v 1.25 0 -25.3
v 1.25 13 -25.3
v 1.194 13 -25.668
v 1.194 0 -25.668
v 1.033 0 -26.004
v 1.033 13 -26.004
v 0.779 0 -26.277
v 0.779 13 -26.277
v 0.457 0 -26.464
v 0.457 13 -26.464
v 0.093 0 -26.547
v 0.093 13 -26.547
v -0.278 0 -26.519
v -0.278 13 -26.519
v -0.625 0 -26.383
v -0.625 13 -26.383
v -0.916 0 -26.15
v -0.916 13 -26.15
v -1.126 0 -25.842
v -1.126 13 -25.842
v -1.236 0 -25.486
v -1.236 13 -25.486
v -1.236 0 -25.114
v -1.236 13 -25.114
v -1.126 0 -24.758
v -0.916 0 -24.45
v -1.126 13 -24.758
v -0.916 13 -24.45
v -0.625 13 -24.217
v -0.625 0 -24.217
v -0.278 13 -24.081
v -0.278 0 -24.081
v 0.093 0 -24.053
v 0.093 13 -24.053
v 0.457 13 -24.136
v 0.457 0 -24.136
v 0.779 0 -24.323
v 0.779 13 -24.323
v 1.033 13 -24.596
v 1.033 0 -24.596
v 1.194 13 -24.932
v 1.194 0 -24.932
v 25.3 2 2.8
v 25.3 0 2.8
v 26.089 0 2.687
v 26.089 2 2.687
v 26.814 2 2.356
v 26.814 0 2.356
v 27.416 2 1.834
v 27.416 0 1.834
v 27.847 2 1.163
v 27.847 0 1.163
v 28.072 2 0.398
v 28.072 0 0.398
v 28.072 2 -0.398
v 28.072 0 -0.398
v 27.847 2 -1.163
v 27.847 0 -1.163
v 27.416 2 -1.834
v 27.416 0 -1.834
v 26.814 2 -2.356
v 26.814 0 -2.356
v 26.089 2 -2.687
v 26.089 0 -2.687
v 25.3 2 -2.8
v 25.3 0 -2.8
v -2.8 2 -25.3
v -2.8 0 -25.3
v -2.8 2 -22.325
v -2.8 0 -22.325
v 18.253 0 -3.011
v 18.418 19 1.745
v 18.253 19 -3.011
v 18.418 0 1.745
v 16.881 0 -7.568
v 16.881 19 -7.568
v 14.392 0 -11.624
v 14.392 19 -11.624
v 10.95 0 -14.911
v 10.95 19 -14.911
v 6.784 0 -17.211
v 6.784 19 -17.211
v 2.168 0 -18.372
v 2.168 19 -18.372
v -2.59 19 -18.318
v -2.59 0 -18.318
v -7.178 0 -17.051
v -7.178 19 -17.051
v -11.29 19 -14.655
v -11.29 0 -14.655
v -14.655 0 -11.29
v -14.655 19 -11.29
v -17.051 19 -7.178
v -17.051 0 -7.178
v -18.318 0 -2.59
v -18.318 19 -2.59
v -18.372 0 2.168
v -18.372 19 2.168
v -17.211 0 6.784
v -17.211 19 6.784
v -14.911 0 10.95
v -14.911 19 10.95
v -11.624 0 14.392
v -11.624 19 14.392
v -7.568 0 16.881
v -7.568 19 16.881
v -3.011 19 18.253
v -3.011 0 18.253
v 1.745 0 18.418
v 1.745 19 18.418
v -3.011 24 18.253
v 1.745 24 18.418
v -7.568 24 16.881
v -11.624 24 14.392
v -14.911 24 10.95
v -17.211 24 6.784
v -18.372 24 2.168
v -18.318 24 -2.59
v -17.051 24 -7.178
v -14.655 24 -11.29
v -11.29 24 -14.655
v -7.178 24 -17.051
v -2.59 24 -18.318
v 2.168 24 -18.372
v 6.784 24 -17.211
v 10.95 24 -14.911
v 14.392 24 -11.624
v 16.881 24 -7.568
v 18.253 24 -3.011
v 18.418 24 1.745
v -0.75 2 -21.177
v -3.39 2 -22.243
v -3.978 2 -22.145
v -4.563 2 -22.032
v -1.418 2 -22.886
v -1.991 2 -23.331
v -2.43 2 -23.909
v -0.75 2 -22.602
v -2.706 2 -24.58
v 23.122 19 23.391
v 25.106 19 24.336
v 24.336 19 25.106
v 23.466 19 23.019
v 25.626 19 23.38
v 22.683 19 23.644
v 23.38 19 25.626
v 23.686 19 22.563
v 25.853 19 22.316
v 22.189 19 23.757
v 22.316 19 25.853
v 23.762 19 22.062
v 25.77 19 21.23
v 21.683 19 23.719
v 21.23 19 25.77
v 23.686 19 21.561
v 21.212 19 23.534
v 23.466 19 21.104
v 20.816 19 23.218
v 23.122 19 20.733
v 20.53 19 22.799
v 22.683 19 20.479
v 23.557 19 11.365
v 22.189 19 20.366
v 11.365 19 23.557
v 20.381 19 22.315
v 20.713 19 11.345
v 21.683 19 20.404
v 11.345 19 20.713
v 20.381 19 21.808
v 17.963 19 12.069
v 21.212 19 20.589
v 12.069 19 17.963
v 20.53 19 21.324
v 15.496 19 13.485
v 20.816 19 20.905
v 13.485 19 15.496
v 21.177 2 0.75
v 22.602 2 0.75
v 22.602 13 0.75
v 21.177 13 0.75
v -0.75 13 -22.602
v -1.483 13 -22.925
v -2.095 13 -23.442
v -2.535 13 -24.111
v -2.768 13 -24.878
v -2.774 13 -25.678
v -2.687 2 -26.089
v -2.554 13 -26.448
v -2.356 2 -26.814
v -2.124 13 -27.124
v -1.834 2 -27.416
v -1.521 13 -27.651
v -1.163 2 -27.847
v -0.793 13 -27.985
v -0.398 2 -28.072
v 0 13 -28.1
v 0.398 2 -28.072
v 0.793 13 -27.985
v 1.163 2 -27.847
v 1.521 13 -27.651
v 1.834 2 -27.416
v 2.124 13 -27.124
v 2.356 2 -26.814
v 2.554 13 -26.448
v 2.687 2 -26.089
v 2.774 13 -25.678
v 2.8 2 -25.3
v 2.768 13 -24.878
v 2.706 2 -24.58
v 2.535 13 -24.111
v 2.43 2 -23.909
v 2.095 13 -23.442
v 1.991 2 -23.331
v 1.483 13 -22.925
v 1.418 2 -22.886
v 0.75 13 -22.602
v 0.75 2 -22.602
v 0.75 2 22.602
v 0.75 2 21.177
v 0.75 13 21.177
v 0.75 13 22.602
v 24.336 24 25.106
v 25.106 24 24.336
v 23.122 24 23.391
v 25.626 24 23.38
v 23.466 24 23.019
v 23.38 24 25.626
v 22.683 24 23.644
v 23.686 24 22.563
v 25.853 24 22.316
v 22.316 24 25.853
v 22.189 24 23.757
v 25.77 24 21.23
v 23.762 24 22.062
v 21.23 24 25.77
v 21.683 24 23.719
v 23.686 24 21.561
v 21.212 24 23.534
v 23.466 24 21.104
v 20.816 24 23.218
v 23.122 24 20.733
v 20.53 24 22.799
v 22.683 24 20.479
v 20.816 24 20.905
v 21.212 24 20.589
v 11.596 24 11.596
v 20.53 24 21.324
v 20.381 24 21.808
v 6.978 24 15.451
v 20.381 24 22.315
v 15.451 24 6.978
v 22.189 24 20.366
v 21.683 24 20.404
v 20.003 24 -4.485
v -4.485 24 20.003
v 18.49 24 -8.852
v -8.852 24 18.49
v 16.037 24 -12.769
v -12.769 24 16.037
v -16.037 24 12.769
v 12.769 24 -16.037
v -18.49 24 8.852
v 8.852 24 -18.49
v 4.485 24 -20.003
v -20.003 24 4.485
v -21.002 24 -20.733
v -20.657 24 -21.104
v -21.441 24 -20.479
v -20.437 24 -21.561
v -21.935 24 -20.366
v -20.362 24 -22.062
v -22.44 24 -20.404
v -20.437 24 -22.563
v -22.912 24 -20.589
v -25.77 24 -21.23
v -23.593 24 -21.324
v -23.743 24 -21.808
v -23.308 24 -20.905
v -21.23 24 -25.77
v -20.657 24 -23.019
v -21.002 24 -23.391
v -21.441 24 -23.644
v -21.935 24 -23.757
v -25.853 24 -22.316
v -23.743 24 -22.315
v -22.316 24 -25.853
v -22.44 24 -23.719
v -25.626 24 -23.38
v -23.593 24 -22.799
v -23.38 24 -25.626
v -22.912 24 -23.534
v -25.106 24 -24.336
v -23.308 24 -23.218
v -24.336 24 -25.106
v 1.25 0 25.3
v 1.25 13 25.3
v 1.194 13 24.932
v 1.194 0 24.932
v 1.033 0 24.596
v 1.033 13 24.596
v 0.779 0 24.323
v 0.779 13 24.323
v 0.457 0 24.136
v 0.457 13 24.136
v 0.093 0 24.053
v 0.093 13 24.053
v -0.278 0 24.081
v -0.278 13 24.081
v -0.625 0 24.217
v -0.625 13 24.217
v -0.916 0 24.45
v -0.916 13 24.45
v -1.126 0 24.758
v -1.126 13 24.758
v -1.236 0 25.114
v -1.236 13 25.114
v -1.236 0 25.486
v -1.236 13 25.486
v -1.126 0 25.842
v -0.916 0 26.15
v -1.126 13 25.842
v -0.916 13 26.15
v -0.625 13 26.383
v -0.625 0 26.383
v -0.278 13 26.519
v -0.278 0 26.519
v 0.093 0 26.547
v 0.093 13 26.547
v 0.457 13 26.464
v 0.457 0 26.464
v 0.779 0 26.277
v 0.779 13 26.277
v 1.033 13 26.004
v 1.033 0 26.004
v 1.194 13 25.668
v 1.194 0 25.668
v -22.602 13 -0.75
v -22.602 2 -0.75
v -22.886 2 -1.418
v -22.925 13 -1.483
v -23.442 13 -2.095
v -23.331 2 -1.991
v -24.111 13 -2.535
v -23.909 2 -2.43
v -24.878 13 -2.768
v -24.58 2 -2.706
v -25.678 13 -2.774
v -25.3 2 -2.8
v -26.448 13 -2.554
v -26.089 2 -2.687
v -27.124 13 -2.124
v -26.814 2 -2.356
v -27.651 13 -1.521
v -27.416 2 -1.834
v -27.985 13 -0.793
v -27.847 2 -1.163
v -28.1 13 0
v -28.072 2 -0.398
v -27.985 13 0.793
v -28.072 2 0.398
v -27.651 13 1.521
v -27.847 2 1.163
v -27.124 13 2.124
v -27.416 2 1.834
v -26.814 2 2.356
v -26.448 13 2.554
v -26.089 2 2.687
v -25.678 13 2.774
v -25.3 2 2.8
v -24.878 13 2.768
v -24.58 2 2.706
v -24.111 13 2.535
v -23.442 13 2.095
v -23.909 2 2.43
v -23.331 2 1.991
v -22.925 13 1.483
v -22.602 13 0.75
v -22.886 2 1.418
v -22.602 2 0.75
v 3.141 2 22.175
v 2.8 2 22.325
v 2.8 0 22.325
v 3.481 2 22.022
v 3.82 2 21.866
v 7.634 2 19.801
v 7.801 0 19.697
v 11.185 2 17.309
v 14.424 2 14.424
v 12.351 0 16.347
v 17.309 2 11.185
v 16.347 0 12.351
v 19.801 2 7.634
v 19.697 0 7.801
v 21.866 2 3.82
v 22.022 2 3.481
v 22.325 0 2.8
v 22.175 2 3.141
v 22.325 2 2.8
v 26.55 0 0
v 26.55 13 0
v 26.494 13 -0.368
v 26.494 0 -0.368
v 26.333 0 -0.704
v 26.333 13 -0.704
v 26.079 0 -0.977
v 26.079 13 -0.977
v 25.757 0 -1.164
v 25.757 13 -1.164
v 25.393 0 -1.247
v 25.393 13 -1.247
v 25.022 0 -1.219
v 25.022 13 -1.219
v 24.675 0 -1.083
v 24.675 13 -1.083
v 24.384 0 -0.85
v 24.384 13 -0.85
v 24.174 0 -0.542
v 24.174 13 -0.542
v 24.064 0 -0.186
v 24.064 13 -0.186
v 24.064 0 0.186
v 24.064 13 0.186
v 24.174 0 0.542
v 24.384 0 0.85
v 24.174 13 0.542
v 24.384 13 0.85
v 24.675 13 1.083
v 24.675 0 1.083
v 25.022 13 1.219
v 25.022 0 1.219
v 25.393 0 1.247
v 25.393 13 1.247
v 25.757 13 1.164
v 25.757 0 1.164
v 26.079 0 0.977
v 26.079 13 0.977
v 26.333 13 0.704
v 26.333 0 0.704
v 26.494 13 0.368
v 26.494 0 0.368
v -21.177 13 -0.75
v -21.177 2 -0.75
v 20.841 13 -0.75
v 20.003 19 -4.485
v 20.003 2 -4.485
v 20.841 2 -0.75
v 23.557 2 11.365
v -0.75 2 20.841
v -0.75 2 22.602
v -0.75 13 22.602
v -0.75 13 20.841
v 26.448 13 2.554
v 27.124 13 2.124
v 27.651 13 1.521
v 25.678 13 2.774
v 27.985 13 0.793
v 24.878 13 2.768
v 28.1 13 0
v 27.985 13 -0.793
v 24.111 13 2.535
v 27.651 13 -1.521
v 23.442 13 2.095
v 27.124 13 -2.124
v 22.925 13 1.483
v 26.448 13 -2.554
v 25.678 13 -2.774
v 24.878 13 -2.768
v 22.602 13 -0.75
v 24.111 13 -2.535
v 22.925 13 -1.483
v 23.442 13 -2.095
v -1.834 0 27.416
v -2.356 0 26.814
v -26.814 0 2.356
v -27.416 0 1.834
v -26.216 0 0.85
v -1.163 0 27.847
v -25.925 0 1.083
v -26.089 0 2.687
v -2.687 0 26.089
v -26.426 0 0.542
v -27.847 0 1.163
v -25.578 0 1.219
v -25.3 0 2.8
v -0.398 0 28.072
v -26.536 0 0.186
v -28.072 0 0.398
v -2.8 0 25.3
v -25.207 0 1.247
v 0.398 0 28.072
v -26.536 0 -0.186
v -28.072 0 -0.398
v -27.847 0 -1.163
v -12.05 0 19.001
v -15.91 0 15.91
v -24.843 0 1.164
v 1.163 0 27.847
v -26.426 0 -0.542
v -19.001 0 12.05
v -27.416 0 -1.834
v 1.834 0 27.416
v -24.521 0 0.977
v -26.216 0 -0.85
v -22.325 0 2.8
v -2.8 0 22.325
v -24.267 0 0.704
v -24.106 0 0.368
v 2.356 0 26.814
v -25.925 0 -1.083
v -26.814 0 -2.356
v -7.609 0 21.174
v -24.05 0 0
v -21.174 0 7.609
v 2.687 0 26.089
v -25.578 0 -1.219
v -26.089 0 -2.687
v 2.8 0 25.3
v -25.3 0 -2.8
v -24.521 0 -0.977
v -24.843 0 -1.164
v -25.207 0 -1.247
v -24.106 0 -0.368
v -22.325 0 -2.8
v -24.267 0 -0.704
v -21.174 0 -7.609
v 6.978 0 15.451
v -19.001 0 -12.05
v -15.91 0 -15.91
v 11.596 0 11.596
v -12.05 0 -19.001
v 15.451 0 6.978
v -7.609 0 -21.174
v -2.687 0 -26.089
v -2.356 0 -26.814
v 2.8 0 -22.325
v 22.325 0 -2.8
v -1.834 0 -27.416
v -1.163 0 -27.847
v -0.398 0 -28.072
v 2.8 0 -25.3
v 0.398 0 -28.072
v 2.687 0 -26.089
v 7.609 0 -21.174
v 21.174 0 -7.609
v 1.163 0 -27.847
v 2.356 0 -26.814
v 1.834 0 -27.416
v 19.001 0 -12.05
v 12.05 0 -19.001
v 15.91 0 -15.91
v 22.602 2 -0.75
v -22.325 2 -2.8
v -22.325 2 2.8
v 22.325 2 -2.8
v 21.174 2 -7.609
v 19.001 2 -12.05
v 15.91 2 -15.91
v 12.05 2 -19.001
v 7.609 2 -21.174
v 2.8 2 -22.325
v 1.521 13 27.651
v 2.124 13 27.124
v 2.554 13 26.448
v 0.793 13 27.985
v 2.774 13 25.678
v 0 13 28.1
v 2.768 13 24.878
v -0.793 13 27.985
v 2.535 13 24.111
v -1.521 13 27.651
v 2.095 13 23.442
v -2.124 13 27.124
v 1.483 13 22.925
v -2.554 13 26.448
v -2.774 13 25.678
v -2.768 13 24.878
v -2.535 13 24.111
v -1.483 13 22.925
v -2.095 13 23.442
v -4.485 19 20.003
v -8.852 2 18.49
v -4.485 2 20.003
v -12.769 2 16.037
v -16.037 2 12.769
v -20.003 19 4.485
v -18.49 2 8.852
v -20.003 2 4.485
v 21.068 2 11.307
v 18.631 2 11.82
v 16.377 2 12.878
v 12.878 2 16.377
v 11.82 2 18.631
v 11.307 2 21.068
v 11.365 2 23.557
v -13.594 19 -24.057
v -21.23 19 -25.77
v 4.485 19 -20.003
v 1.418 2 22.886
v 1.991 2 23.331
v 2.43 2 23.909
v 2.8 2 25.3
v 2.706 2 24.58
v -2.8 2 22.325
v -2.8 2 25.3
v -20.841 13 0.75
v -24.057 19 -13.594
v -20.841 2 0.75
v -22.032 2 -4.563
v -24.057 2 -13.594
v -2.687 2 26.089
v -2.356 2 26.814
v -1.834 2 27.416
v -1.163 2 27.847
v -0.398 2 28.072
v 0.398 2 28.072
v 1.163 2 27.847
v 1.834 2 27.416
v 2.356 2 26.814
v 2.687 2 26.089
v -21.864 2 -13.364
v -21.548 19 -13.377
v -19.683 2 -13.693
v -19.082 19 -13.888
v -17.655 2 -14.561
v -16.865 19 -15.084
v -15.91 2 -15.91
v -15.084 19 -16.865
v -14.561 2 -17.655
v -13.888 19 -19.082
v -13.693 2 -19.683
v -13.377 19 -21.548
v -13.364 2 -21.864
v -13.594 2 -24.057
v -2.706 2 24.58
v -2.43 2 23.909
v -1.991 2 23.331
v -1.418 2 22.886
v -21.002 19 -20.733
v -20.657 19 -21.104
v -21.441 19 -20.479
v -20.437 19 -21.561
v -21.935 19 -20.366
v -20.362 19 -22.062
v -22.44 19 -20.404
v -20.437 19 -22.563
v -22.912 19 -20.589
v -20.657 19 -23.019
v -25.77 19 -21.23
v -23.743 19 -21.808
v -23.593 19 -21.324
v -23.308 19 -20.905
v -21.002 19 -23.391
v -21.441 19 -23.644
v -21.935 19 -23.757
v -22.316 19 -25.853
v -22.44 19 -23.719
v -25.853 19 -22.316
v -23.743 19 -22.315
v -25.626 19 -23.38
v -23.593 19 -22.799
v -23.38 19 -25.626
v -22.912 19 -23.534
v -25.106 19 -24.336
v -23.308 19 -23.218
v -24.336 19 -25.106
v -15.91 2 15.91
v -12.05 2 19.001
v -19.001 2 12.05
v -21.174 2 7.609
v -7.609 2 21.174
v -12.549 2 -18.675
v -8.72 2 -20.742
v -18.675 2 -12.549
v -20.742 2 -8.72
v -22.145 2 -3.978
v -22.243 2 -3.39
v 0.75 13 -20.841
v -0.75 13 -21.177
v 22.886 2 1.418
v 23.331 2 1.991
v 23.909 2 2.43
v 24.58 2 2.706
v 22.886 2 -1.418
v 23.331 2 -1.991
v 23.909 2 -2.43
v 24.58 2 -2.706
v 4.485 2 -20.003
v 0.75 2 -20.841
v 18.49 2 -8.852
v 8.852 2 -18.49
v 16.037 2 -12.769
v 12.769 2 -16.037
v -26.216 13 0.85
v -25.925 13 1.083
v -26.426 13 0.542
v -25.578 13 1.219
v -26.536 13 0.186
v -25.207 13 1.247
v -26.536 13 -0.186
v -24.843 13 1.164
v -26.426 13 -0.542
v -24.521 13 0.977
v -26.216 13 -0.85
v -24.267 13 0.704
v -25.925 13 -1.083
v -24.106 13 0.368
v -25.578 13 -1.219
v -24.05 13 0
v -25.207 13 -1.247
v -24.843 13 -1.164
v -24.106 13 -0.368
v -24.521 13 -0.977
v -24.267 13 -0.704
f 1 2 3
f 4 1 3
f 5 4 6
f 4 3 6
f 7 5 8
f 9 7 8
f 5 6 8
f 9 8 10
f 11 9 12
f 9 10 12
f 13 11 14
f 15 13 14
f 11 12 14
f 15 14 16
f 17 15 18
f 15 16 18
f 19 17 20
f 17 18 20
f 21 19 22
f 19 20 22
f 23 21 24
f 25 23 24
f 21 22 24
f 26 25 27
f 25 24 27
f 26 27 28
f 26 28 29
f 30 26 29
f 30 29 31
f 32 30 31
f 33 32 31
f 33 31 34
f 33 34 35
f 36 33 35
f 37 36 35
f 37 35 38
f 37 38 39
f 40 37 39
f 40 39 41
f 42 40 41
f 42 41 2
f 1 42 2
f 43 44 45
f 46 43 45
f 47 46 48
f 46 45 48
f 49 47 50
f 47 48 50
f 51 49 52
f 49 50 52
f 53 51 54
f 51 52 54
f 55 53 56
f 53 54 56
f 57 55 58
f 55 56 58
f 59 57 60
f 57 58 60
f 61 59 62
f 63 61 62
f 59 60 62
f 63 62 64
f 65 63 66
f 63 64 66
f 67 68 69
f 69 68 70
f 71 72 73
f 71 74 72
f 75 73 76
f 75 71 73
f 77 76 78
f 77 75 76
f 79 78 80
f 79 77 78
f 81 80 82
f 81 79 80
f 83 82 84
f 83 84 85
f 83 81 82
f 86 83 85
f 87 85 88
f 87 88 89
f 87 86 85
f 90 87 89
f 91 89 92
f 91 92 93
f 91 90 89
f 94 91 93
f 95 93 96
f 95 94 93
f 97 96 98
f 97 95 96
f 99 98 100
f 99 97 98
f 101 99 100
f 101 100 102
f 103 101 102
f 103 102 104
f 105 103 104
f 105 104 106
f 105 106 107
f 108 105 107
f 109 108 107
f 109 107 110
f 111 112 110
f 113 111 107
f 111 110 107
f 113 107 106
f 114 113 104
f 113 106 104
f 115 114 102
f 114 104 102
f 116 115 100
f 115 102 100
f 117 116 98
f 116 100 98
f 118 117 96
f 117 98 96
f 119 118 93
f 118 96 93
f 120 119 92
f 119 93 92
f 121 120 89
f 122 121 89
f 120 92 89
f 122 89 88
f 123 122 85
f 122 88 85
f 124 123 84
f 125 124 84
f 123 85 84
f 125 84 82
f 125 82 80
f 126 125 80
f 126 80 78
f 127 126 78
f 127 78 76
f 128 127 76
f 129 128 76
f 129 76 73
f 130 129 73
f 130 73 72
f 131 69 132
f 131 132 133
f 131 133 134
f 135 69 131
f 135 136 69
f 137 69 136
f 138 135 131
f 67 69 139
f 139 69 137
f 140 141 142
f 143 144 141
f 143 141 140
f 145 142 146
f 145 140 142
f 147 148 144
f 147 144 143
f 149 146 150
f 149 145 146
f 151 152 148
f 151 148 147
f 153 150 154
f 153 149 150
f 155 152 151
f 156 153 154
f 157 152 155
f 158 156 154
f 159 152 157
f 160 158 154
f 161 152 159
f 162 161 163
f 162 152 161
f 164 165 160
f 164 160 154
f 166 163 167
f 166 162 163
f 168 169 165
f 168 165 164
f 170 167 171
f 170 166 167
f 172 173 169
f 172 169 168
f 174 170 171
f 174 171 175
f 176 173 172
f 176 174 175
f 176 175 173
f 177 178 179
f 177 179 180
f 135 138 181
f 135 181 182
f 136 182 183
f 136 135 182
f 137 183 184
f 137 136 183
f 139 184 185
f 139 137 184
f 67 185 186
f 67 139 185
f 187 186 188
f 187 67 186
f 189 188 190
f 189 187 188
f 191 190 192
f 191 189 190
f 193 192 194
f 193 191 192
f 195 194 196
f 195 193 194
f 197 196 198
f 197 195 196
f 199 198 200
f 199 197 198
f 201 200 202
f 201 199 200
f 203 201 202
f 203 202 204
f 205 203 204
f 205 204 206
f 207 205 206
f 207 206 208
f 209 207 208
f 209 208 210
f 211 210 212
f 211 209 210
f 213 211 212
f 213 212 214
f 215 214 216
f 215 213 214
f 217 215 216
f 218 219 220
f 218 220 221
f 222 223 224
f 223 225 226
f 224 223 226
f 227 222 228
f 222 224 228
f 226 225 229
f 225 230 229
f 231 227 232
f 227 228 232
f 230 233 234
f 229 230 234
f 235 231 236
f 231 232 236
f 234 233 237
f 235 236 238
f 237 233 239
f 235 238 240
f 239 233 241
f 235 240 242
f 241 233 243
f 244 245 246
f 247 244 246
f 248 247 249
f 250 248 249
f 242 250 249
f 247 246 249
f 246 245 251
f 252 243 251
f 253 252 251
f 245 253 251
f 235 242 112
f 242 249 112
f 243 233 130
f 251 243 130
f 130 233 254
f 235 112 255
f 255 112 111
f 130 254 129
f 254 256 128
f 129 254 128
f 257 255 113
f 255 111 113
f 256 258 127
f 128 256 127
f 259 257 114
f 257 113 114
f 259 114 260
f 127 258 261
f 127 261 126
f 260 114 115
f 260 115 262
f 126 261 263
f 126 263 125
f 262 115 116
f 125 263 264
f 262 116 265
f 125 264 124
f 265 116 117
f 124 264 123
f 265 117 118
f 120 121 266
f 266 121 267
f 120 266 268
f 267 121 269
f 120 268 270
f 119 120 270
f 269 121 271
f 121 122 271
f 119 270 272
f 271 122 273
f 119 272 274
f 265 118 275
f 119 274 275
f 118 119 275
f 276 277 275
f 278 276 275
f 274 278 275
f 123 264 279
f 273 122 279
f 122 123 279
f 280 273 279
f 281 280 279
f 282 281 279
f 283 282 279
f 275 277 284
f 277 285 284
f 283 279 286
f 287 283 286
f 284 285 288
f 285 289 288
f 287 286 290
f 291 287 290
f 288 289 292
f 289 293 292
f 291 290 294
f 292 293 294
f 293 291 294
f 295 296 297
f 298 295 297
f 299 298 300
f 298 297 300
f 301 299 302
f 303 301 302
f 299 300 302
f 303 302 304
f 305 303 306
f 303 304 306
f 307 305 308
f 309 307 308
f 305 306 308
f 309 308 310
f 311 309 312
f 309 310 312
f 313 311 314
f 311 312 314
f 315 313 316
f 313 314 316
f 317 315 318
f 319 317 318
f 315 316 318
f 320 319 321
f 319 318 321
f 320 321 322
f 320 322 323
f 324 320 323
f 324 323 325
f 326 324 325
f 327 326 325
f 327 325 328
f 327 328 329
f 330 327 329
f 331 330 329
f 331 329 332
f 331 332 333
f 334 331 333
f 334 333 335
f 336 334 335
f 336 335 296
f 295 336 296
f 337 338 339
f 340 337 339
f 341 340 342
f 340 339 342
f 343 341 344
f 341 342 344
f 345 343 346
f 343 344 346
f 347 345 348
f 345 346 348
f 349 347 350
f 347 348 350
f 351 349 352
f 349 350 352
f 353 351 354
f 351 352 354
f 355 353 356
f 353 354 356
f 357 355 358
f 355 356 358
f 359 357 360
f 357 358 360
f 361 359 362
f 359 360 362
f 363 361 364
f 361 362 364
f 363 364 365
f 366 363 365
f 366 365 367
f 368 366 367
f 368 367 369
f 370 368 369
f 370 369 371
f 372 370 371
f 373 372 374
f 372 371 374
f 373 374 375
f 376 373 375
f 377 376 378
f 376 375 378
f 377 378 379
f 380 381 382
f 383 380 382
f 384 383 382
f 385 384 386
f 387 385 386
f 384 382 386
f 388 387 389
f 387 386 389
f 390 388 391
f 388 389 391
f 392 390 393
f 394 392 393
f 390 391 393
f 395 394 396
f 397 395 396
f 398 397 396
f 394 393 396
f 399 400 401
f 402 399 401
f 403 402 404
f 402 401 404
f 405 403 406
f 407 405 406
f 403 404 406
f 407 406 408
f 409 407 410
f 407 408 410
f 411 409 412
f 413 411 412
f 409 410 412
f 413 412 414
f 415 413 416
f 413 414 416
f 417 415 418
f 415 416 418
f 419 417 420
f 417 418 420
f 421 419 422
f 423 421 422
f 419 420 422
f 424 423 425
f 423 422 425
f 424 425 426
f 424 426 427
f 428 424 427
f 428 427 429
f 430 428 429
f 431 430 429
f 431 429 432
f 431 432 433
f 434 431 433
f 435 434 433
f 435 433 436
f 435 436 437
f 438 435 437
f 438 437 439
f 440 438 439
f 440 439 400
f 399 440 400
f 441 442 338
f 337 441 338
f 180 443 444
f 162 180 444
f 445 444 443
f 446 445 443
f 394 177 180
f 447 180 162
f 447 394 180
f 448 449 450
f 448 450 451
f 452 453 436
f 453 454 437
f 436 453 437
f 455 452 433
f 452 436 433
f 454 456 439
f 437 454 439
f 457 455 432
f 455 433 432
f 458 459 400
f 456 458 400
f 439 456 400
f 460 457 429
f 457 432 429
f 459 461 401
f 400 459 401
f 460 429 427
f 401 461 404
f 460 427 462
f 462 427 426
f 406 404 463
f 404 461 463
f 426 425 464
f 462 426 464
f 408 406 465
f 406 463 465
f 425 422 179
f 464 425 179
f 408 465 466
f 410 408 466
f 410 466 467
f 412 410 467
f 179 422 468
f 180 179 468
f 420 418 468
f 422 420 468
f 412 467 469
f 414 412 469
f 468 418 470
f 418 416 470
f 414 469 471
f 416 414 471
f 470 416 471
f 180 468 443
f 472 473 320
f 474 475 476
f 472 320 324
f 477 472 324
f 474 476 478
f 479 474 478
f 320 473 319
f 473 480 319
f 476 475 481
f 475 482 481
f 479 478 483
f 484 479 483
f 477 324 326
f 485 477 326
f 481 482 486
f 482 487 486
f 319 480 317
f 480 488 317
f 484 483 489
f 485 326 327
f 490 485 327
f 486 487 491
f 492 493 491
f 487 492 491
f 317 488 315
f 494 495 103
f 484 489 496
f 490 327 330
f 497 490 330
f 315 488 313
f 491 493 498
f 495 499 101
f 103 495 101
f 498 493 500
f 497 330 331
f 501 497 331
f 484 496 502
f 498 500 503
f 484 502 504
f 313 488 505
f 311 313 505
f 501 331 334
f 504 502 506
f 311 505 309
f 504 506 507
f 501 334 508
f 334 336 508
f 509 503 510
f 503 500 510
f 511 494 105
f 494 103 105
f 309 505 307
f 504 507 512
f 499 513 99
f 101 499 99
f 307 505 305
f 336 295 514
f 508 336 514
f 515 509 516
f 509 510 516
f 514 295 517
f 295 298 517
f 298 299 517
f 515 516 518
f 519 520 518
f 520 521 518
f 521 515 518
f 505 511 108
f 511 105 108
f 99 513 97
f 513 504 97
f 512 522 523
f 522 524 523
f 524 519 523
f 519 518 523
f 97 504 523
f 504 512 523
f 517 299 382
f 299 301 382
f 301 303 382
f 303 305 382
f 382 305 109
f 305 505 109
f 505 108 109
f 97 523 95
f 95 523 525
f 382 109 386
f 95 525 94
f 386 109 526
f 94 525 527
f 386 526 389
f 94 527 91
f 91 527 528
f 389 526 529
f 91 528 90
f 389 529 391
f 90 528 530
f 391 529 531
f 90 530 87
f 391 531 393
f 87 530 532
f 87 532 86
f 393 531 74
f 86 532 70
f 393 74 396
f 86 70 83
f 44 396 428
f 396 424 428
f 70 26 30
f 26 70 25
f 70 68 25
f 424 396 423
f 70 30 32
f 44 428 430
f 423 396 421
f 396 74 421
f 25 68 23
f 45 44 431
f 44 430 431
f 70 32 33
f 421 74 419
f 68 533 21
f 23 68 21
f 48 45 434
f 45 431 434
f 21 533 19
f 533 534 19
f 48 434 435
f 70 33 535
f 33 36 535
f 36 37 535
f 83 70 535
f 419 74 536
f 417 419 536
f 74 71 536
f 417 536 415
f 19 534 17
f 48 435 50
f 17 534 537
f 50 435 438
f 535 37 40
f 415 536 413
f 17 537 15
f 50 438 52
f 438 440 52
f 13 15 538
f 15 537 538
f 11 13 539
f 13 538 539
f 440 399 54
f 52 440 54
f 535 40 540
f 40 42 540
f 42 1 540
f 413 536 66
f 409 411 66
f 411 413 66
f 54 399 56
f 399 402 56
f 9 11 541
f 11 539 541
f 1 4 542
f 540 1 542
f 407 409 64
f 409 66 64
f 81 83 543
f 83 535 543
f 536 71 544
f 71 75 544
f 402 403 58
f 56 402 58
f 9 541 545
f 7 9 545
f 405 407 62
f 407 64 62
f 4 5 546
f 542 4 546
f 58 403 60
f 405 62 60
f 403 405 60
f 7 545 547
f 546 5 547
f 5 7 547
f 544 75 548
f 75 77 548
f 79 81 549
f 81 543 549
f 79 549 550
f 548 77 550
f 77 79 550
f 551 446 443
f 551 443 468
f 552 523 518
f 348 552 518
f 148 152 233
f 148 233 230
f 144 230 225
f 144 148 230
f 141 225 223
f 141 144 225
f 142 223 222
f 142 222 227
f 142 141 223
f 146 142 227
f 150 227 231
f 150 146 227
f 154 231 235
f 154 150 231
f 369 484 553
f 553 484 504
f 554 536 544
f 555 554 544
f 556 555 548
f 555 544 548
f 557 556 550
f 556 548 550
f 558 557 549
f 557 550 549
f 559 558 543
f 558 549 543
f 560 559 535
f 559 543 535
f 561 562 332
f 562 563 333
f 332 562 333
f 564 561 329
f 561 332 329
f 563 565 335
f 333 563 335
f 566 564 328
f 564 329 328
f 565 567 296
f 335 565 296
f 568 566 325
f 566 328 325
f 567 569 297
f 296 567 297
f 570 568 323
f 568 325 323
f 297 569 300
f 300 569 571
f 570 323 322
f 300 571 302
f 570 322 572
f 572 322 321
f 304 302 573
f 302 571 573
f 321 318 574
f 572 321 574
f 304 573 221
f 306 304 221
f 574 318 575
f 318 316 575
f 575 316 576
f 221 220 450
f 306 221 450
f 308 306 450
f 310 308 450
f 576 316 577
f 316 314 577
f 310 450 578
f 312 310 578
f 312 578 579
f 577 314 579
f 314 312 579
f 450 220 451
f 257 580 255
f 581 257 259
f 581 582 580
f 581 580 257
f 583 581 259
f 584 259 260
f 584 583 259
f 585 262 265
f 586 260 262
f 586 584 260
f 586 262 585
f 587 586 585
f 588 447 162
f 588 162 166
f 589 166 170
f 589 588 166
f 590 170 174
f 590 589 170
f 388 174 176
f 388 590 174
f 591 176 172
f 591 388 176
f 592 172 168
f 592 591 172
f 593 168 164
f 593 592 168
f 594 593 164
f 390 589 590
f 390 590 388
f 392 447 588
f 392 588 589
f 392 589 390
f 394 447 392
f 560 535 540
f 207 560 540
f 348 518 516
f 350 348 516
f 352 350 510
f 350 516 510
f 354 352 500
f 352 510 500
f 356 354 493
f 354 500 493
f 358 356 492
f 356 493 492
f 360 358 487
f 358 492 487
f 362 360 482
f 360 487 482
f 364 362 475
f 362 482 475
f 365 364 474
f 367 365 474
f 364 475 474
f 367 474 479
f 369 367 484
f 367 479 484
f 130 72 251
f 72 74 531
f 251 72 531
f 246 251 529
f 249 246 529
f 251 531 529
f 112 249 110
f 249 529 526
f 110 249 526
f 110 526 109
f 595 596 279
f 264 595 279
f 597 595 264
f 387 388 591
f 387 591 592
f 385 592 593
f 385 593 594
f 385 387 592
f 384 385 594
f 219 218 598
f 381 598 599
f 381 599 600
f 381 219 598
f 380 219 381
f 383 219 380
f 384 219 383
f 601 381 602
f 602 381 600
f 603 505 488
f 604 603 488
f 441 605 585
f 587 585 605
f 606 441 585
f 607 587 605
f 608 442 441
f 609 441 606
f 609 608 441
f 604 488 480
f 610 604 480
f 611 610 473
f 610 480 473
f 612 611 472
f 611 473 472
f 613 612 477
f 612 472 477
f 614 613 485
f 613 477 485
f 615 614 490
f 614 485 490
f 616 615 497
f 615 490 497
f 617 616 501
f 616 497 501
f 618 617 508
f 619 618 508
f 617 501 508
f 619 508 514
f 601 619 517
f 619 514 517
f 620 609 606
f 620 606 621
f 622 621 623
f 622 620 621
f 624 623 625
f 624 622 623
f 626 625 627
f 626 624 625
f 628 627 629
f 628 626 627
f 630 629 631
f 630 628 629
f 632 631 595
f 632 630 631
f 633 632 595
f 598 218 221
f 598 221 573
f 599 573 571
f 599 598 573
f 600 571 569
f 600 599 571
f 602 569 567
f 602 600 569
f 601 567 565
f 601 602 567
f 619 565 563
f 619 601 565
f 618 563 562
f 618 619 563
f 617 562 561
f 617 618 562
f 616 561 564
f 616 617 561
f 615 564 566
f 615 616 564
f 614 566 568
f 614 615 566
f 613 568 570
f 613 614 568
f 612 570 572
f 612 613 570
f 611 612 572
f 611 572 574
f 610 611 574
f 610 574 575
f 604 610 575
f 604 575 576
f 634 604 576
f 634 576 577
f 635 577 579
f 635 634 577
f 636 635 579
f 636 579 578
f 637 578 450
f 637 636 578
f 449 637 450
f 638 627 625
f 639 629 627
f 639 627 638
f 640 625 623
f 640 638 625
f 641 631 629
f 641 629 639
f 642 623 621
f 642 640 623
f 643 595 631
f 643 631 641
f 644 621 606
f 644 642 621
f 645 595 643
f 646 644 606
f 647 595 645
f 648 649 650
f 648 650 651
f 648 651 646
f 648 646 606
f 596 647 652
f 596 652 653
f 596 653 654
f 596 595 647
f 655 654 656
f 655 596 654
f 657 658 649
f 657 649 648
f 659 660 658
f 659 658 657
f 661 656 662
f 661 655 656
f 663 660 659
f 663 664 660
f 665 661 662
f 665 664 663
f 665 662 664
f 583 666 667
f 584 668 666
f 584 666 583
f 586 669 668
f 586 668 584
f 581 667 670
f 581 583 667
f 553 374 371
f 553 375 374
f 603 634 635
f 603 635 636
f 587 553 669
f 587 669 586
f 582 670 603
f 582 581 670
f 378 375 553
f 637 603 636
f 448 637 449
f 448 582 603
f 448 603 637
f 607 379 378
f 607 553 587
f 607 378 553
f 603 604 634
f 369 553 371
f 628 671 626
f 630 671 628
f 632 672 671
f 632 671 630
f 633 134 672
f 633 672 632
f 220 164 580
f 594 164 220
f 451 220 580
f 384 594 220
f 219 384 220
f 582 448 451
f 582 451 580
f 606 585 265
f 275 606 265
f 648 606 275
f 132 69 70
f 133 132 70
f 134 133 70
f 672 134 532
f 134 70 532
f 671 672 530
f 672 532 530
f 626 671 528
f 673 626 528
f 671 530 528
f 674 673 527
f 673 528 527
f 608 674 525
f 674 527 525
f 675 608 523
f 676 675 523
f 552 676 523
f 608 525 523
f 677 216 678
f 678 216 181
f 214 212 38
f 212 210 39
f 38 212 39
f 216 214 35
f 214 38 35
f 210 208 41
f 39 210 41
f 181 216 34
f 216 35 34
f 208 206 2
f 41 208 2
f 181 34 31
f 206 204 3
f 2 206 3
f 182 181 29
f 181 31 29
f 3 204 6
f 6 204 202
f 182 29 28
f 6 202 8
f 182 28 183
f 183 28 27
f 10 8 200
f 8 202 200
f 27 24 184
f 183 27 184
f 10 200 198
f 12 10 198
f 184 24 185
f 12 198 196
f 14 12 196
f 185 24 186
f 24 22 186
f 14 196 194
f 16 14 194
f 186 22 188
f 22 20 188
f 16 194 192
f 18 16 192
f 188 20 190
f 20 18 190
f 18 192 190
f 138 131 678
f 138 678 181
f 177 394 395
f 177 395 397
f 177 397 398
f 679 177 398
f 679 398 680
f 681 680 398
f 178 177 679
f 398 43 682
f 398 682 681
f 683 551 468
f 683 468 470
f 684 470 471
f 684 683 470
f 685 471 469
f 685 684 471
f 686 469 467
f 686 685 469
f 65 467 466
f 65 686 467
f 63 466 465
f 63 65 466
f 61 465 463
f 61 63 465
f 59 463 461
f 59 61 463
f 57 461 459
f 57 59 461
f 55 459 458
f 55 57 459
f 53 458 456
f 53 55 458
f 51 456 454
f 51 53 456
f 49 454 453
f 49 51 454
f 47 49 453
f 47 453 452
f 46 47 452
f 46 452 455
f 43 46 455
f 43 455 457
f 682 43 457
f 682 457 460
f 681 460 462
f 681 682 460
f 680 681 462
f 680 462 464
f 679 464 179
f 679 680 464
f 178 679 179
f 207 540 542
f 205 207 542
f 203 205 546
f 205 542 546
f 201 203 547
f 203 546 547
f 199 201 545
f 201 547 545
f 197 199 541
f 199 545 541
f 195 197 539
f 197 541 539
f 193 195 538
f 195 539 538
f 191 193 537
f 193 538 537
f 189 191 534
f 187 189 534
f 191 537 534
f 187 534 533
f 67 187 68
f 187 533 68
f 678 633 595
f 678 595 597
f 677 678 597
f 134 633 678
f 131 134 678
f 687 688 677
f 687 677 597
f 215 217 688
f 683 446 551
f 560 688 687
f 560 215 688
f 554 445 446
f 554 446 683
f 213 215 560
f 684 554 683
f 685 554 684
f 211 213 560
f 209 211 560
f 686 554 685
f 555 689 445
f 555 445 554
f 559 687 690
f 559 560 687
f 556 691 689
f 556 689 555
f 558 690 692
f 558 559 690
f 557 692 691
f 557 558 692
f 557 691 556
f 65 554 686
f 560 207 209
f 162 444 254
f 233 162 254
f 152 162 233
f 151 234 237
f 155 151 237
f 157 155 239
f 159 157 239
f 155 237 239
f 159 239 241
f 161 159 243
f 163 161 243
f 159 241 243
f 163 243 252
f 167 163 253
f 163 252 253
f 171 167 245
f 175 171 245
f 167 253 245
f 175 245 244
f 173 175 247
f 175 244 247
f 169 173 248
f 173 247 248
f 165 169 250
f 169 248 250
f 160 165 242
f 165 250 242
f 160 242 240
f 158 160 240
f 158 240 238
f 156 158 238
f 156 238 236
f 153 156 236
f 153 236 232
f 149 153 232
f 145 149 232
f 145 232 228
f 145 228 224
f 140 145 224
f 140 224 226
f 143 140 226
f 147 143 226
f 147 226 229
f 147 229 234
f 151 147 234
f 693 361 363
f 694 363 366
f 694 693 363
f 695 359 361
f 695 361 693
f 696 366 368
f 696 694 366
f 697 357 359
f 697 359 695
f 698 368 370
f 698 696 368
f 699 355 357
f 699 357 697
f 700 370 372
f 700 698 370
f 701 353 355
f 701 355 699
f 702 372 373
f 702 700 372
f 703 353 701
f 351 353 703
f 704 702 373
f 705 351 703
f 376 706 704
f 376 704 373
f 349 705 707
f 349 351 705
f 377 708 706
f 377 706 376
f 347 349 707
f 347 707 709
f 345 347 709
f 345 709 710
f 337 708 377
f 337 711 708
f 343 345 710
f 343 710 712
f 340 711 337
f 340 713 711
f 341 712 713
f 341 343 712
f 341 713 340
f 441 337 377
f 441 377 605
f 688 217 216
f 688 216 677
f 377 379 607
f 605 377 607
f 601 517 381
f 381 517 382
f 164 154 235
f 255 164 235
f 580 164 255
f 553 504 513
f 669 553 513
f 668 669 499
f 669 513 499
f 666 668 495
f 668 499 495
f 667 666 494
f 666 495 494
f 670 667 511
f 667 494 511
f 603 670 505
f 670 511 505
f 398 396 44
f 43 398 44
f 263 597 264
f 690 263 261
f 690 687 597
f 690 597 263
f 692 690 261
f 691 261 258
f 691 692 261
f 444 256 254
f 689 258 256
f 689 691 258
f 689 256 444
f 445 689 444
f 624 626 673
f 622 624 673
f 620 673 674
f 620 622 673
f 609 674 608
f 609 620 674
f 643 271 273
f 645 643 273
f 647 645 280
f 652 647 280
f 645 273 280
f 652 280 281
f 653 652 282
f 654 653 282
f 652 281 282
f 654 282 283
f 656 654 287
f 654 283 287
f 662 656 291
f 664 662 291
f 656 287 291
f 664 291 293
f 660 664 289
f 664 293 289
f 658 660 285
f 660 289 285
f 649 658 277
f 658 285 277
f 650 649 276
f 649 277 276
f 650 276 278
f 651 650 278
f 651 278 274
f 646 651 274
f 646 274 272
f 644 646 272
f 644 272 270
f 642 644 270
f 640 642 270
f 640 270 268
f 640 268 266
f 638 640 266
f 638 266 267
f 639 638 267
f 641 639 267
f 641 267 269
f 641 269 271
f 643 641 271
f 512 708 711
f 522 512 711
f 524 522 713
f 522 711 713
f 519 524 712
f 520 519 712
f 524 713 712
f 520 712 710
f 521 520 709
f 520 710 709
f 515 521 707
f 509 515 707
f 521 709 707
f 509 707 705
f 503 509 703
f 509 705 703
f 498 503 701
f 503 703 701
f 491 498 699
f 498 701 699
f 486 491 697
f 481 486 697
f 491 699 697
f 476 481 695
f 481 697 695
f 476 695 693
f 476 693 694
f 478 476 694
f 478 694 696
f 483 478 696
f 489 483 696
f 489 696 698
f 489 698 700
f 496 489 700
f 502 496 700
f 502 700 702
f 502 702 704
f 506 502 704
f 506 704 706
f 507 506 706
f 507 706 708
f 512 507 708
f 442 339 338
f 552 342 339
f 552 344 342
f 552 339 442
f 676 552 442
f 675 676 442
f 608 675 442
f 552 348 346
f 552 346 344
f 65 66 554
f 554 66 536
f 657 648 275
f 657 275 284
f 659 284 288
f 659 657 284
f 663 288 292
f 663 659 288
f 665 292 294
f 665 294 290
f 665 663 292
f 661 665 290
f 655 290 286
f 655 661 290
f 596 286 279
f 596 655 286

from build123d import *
from build123d.topology import SkipClean

# Parameters (mm, degrees)
EXTRUDE_1_DEPTH     = 2
EXTRUDE_2_DEPTH     = 17
EXTRUDE_3_DEPTH     = 5
HOLE_WIZARD_M31_D   = 3.4
EXTRUDE_4_DEPTH     = 11
CUT_EXTRUDE_1_DEPTH = 11
HOLE_WIZARD_M31_2_D = 2.5


with BuildPart() as part:
    # Sketch 1 → Extrude 1 (new body)
    with BuildSketch(Plane(origin=(0, 0, 0), x_dir=(1, 0, 0), z_dir=(0, 1, 0))):
        with BuildLine():
            Line((22.325097984, -2.8), (25.3, -2.8))
            ThreePointArc((25.3, -2.8), (28.1, 0), (25.3, 2.8))
            Line((25.3, 2.8), (22.325097984, 2.8))
            ThreePointArc((22.325097984, 2.8), (15.909902577, 15.909902577), (2.8, 22.325097984))
            Line((2.8, 22.325097984), (2.8, 25.3))
            ThreePointArc((2.8, 25.3), (0, 28.1), (-2.8, 25.3))
            Line((-2.8, 25.3), (-2.8, 22.325097984))
            ThreePointArc((-2.8, 22.325097984), (-15.909902577, 15.909902577), (-22.325097984, 2.8))
            Line((-22.325097984, 2.8), (-25.3, 2.8))
            ThreePointArc((-25.3, 2.8), (-28.1, 0), (-25.3, -2.8))
            Line((-25.3, -2.8), (-22.325097984, -2.8))
            ThreePointArc((-22.325097984, -2.8), (-15.909902577, -15.909902577), (-2.8, -22.325097984))
            Line((-2.8, -22.325097984), (-2.8, -25.3))
            ThreePointArc((-2.8, -25.3), (0, -28.1), (2.8, -25.3))
            Line((2.8, -25.3), (2.8, -22.325097984))
            ThreePointArc((2.8, -22.325097984), (14.4243682, -14.4243682), (22.325097984, -2.8))
        make_face()
        with BuildLine():
            ThreePointArc((18.417505142, -1.745137346), (-13.081475452, 13.081475452), (1.745137346, -18.417505142))
            ThreePointArc((1.745137346, -18.417505142), (11.595941075, -11.595941075), (18.417505142, -1.745137346))
        make_face(mode=Mode.SUBTRACT)
    extrude(amount=EXTRUDE_1_DEPTH)

    # Sketch 2 → Extrude 2 (add)
    with BuildSketch(Plane(origin=(0, 2, 0), x_dir=(1, 0, 0), z_dir=(0, 1, 0))):
        with BuildLine():
            Line((20.003268693, 4.485447761), (23.557492243, -11.364940531))
            ThreePointArc((23.557492243, -11.364940531), (14.4243682, -14.4243682), (11.364940531, -23.557492243))
            Line((11.364940531, -23.557492243), (-4.485447761, -20.003268693))
            ThreePointArc((-4.485447761, -20.003268693), (-14.495689014, -14.495689014), (-20.003268693, -4.485447761))
            Line((-20.003268693, -4.485447761), (-24.05725546, 13.593680769))
            ThreePointArc((-24.05725546, 13.593680769), (-15.909902577, 15.909902577), (-13.593680769, 24.05725546))
            Line((-13.593680769, 24.05725546), (4.485447761, 20.003268693))
            ThreePointArc((4.485447761, 20.003268693), (14.495689014, 14.495689014), (20.003268693, 4.485447761))
        make_face()
        with BuildLine():
            ThreePointArc((1.745137346, -18.417505142), (11.595941075, -11.595941075), (18.417505142, -1.745137346))
            ThreePointArc((18.417505142, -1.745137346), (-13.081475452, 13.081475452), (1.745137346, -18.417505142))
        make_face(mode=Mode.SUBTRACT)
    extrude(amount=EXTRUDE_2_DEPTH)

    # Sketch 3 → Extrude 3 (add)
    with BuildSketch(Plane(origin=(0, 19, 0), x_dir=(1, 0, 0), z_dir=(0, 1, 0))):
        with BuildLine():
            Line((20.003268693, 4.485447761), (25.76965455, -21.23028272))
            ThreePointArc((25.76965455, -21.23028272), (24.748737342, -24.748737342), (21.23028272, -25.76965455))
            Line((21.23028272, -25.76965455), (-4.485447761, -20.003268693))
            ThreePointArc((-4.485447761, -20.003268693), (-14.495689014, -14.495689014), (-20.003268693, -4.485447761))
            Line((-20.003268693, -4.485447761), (-25.76965455, 21.23028272))
            ThreePointArc((-25.76965455, 21.23028272), (-24.748737342, 24.748737342), (-21.23028272, 25.76965455))
            Line((-21.23028272, 25.76965455), (4.485447761, 20.003268693))
            ThreePointArc((4.485447761, 20.003268693), (14.495689014, 14.495689014), (20.003268693, 4.485447761))
        make_face()
    extrude(amount=EXTRUDE_3_DEPTH)

    # Hole Wizard M31 (through all)
    with Locations(Plane(origin=(0, 0, 0), x_dir=(-1, 0, 0), z_dir=(0, -1, 0))):
        with Locations((-22.061731573, -22.061731573), (22.061731573, 22.061731573)):
            Hole(HOLE_WIZARD_M31_D / 2)

    # Sketch 6 → Extrude 4 (add)
    with SkipClean():  # the faces are left unmerged after this step: merging them gives an invalid solid
        with BuildSketch(Plane(origin=(0, 2, 0), x_dir=(1, 0, 0), z_dir=(0, 1, 0))):
            with BuildLine():
                Line((0.75, 20.840889586), (-0.75, 21.177243196))
                Line((-0.75, 21.177243196), (-0.75, 22.602315808))
                ThreePointArc((-0.75, 22.602315808), (0, 28.1), (0.75, 22.602315808))
                Line((0.75, 22.602315808), (0.75, 20.840889586))
            make_face()
            with BuildLine():
                Line((-21.177243196, 0.75), (-22.602315808, 0.75))
                ThreePointArc((-22.602315808, 0.75), (-28.1, 0), (-22.602315808, -0.75))
                Line((-22.602315808, -0.75), (-20.840889586, -0.75))
                Line((-20.840889586, -0.75), (-21.177243196, 0.75))
            make_face()
            with BuildLine():
                Line((21.177243196, -0.75), (20.840889586, 0.75))
                Line((20.840889586, 0.75), (22.602315808, 0.75))
                ThreePointArc((22.602315808, 0.75), (28.1, 0), (22.602315808, -0.75))
                Line((22.602315808, -0.75), (21.177243196, -0.75))
            make_face()
            with BuildLine():
                Line((-0.75, -20.840889586), (0.75, -21.177243196))
                Line((0.75, -21.177243196), (0.75, -22.602315808))
                ThreePointArc((0.75, -22.602315808), (0, -28.1), (-0.75, -22.602315808))
                Line((-0.75, -22.602315808), (-0.75, -20.840889586))
            make_face()
        extrude(amount=EXTRUDE_4_DEPTH)

    # Sketch 7 → Cut-Extrude 1 (cut)
    with SkipClean():  # the faces are left unmerged after this step: merging them gives an invalid solid
        with BuildSketch(Plane.XZ.offset(-19)):
            with BuildLine():
                ThreePointArc((18.417505142, 1.745137346), (11.595941075, 11.595941075), (1.745137346, 18.417505142))
                ThreePointArc((1.745137346, 18.417505142), (-13.081475452, -13.081475452), (18.417505142, 1.745137346))
            make_face()
        extrude(amount=-CUT_EXTRUDE_1_DEPTH, mode=Mode.SUBTRACT)

    # Hole Wizard M31 2 (through all)
    with Locations(Plane(origin=(0, 0, 0), x_dir=(-1, 0, 0), z_dir=(0, -1, 0))):
        with Locations((0, -25.3), (-25.3, 0), (0, 25.3), (25.3, 0)):
            Hole(HOLE_WIZARD_M31_2_D / 2)


solid = part.part
